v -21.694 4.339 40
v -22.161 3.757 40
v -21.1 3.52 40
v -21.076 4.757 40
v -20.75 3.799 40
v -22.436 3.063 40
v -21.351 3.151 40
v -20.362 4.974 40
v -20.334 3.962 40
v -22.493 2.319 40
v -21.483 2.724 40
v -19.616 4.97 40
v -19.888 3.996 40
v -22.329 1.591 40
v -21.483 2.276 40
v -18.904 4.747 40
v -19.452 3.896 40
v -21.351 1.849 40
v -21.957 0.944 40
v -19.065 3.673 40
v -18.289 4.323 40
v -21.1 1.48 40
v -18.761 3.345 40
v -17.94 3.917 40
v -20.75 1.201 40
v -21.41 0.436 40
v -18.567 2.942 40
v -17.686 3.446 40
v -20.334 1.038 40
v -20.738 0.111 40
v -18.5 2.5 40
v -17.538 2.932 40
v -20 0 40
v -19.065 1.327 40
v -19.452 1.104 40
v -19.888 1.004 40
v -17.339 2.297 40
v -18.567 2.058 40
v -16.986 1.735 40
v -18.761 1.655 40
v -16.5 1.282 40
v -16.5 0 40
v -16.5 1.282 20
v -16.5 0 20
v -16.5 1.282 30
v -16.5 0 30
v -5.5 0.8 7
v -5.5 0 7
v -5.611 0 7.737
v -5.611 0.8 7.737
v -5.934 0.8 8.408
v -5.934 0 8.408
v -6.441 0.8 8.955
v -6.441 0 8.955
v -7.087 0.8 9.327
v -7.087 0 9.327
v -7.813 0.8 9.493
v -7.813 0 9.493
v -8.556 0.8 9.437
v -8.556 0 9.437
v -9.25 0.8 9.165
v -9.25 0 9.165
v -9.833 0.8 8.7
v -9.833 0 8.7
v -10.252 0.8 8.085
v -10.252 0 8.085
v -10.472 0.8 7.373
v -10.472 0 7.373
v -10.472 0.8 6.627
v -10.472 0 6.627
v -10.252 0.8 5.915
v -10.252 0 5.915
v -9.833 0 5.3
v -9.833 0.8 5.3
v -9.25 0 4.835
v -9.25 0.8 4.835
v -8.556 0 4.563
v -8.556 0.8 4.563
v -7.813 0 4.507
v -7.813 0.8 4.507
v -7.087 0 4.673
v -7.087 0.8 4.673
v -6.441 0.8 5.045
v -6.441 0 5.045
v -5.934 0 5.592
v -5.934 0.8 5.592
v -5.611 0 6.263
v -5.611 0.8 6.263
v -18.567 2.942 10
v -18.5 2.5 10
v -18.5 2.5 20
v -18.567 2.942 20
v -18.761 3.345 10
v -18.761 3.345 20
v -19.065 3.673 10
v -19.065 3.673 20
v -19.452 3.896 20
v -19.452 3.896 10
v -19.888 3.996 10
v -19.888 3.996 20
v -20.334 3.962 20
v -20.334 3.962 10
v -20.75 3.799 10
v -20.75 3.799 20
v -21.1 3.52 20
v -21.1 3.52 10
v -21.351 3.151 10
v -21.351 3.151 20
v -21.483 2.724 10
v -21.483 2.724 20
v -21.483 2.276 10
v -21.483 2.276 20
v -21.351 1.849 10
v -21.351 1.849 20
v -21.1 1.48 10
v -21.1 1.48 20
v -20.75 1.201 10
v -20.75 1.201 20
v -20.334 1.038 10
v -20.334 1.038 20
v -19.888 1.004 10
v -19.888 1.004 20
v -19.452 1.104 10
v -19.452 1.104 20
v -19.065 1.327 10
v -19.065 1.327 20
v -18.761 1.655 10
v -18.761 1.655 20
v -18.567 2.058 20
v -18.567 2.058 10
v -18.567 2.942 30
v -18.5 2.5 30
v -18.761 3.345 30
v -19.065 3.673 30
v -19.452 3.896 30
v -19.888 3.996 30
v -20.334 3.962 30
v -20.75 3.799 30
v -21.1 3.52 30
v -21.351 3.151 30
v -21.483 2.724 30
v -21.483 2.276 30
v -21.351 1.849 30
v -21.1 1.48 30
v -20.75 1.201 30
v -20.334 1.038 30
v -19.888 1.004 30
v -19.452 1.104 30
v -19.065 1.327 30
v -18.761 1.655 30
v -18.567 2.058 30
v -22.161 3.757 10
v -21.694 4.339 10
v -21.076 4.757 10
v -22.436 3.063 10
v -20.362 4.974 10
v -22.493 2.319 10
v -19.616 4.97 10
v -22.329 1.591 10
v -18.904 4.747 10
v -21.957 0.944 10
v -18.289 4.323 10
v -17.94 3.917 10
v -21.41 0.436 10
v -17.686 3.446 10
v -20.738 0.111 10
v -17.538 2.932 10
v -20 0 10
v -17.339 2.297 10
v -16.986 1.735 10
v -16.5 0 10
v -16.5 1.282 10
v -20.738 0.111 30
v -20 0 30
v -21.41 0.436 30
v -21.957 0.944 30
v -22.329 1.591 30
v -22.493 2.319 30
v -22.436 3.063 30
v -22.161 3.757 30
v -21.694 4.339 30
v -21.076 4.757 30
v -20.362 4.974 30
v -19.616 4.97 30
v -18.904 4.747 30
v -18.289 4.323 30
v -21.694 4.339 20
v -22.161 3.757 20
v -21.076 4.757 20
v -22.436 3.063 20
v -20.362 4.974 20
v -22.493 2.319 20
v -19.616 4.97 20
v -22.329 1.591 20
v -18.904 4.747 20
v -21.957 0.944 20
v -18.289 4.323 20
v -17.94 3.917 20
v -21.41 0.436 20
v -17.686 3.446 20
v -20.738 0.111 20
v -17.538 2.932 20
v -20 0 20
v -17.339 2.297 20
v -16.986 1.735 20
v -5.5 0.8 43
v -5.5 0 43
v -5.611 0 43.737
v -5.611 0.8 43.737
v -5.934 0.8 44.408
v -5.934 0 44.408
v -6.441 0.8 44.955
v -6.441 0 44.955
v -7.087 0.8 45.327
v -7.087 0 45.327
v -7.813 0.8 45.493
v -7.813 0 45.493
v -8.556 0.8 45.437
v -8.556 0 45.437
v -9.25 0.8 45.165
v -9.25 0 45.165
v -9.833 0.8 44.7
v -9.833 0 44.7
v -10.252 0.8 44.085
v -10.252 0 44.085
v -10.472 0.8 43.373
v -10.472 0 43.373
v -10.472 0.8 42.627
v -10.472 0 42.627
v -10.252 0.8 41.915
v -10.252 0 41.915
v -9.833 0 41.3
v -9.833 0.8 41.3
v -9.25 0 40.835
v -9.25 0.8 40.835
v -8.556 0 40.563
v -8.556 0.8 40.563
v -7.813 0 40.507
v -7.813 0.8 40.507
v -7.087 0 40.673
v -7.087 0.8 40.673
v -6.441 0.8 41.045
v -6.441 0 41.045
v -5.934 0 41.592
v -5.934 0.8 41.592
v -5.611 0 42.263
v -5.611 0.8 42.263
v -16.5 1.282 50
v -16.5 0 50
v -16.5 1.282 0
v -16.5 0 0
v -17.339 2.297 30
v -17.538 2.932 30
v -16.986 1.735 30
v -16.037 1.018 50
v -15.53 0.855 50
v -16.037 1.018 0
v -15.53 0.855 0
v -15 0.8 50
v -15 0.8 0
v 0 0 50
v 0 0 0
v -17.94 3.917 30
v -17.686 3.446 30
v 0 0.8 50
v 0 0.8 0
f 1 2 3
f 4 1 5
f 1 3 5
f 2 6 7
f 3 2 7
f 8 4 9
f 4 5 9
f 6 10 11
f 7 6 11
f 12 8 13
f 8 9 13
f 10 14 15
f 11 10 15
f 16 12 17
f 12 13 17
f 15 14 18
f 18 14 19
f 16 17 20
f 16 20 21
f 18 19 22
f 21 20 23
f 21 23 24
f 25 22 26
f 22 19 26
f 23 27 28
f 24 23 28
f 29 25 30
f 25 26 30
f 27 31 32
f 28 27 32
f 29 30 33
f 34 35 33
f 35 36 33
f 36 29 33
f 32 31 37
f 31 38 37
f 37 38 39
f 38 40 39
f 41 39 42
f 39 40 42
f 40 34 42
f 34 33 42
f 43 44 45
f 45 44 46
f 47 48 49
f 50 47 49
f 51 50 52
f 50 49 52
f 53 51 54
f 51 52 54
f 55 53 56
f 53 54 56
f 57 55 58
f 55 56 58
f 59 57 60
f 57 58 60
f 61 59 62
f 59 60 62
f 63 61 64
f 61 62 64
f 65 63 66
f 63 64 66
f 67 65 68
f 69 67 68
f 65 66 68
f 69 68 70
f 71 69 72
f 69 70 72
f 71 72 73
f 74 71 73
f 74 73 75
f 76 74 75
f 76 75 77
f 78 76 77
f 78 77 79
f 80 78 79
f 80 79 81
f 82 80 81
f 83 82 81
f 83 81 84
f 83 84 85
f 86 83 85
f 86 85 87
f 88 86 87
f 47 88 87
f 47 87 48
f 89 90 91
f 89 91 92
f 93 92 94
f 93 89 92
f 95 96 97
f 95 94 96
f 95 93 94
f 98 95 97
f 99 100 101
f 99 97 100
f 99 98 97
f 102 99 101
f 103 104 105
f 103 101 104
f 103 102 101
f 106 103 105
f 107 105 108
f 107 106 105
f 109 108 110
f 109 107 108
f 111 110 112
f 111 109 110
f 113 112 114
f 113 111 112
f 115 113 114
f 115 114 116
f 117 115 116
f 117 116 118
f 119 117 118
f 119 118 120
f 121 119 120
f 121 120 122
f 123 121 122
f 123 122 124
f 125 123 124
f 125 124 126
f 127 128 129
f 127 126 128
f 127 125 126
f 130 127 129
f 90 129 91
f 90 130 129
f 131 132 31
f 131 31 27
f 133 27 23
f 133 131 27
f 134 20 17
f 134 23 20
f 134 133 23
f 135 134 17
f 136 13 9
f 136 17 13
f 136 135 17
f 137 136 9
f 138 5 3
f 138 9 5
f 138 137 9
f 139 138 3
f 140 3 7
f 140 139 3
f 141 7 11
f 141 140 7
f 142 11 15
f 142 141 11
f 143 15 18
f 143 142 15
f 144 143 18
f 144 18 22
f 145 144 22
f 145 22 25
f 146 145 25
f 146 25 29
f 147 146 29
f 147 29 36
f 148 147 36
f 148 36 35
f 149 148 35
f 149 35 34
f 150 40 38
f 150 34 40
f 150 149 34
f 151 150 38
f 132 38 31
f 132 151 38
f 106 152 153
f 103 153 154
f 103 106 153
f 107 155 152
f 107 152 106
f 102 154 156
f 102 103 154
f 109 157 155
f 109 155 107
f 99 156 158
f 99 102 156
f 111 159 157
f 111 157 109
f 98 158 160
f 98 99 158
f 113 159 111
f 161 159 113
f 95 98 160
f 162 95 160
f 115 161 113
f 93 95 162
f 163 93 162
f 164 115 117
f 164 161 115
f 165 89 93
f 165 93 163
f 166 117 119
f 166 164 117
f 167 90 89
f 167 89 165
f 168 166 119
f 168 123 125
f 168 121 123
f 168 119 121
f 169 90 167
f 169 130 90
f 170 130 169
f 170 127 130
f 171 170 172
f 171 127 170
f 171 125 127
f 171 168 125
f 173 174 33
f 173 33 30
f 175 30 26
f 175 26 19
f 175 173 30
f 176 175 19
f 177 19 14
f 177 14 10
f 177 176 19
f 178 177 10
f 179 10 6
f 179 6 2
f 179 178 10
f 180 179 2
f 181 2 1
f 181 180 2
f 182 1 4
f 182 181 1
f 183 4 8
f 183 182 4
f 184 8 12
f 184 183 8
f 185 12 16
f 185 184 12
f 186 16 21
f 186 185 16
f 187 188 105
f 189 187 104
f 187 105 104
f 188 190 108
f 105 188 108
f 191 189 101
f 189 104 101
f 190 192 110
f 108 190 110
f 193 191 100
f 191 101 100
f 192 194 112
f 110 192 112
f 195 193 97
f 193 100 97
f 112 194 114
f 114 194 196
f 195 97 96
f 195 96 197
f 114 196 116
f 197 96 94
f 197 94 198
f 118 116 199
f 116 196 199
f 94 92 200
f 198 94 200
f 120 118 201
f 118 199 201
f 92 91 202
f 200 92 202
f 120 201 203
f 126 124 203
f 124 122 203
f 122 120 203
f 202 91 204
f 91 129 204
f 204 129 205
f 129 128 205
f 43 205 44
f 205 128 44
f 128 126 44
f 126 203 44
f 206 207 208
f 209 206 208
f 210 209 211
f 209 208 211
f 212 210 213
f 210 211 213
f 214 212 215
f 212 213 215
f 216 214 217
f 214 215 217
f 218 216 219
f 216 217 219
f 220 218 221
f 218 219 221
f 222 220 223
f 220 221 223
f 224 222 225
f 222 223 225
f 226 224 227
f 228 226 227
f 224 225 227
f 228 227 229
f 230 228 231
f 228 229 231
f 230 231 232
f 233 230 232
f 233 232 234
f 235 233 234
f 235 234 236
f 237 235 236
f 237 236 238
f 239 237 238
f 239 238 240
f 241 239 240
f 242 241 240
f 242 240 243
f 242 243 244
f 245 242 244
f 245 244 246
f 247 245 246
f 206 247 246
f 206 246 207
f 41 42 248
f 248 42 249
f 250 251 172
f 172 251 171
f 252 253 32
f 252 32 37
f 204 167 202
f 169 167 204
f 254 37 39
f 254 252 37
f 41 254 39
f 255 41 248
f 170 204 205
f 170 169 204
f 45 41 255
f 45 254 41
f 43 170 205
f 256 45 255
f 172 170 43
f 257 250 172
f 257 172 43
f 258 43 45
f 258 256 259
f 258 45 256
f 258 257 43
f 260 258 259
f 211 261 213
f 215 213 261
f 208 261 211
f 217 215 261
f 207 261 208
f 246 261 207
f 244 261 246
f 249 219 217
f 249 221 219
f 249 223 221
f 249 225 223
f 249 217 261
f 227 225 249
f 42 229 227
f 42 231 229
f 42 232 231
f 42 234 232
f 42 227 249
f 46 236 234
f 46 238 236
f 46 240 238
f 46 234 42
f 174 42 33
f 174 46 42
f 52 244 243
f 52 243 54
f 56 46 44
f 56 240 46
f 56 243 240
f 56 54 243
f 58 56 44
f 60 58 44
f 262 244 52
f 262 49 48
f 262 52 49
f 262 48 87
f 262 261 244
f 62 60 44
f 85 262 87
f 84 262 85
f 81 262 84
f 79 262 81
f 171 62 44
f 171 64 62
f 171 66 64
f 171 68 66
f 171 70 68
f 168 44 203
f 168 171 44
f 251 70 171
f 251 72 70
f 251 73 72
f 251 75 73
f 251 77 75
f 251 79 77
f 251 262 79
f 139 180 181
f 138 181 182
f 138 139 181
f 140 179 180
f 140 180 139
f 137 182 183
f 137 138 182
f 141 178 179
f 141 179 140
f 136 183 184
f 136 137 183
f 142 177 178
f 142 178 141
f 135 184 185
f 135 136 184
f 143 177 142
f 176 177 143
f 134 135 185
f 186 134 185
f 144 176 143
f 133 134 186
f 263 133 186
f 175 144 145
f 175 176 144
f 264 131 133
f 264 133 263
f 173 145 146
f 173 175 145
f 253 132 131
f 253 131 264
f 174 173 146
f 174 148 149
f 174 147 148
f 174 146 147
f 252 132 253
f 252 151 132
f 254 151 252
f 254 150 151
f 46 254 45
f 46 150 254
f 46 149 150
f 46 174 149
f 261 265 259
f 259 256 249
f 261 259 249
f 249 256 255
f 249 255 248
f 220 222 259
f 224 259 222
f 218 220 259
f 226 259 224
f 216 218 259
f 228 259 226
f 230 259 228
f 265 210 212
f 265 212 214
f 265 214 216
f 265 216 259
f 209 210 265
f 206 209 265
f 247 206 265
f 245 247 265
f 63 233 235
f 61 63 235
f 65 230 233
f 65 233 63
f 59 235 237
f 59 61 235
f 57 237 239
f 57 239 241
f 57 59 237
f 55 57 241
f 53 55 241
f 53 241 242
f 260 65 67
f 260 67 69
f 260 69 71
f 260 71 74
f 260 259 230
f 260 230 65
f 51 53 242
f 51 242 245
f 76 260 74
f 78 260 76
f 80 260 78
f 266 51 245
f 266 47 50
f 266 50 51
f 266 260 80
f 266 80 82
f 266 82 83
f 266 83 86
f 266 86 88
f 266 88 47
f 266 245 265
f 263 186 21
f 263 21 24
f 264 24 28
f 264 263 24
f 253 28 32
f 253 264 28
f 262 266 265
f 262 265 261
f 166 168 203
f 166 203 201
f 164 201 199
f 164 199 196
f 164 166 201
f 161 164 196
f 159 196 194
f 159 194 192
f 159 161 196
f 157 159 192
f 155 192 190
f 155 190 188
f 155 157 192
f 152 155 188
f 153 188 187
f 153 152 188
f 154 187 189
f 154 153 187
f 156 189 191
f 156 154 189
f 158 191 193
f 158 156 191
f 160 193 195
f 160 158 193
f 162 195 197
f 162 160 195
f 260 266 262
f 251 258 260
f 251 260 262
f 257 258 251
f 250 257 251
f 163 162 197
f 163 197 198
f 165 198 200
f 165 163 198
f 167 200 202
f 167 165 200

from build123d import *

# Parameters (mm, degrees)
ESBO_O1_R                = 1.5
RESSALTO_EXTRUS_O1_DEPTH = 50
ESBO_O2_R                = 2.5
ESBO_O2_W                = 6
ESBO_O2_H                = 10
CORTE_EXTRUS_O2_DEPTH    = 6


with BuildPart() as part:
    # Esboço1 → Ressalto-extrusão1 (new body)
    with BuildSketch(Plane.XY):
        with BuildLine():
            Line((0, 0), (-20, 0))
            ThreePointArc((-20, 0), (-22.324602514, 3.419903881), (-18.2892713, 4.32302148))
            ThreePointArc((-18.2892713, 4.32302148), (-17.800459182, 3.688284557), (-17.537523452, 2.9315197))
            ThreePointArc((-17.537523452, 2.9315197), (-16.656985327, 1.403588896), (-15, 0.8))
            Line((-15, 0.8), (0, 0.8))
            Line((0, 0.8), (0, 0))
        make_face()
        with Locations((-20, 2.5)):
            Circle(ESBO_O1_R, mode=Mode.SUBTRACT)
    extrude(amount=RESSALTO_EXTRUS_O1_DEPTH)

    # Esboço2 → Corte-extrusão2 (cut, through all)
    with BuildSketch(Plane.XZ):
        with Locations((-8, 43)):
            Circle(ESBO_O2_R)
        with Locations((-8, 7)):
            Circle(ESBO_O2_R)
        with Locations((-19.5, 5)):
            Rectangle(ESBO_O2_W, ESBO_O2_H)
        with Locations((-19.5, 25)):
            Rectangle(ESBO_O2_W, ESBO_O2_H)
        with Locations((-19.5, 45)):
            Rectangle(ESBO_O2_W, ESBO_O2_H)
    extrude(amount=-CORTE_EXTRUS_O2_DEPTH, mode=Mode.SUBTRACT)


solid = part.part
